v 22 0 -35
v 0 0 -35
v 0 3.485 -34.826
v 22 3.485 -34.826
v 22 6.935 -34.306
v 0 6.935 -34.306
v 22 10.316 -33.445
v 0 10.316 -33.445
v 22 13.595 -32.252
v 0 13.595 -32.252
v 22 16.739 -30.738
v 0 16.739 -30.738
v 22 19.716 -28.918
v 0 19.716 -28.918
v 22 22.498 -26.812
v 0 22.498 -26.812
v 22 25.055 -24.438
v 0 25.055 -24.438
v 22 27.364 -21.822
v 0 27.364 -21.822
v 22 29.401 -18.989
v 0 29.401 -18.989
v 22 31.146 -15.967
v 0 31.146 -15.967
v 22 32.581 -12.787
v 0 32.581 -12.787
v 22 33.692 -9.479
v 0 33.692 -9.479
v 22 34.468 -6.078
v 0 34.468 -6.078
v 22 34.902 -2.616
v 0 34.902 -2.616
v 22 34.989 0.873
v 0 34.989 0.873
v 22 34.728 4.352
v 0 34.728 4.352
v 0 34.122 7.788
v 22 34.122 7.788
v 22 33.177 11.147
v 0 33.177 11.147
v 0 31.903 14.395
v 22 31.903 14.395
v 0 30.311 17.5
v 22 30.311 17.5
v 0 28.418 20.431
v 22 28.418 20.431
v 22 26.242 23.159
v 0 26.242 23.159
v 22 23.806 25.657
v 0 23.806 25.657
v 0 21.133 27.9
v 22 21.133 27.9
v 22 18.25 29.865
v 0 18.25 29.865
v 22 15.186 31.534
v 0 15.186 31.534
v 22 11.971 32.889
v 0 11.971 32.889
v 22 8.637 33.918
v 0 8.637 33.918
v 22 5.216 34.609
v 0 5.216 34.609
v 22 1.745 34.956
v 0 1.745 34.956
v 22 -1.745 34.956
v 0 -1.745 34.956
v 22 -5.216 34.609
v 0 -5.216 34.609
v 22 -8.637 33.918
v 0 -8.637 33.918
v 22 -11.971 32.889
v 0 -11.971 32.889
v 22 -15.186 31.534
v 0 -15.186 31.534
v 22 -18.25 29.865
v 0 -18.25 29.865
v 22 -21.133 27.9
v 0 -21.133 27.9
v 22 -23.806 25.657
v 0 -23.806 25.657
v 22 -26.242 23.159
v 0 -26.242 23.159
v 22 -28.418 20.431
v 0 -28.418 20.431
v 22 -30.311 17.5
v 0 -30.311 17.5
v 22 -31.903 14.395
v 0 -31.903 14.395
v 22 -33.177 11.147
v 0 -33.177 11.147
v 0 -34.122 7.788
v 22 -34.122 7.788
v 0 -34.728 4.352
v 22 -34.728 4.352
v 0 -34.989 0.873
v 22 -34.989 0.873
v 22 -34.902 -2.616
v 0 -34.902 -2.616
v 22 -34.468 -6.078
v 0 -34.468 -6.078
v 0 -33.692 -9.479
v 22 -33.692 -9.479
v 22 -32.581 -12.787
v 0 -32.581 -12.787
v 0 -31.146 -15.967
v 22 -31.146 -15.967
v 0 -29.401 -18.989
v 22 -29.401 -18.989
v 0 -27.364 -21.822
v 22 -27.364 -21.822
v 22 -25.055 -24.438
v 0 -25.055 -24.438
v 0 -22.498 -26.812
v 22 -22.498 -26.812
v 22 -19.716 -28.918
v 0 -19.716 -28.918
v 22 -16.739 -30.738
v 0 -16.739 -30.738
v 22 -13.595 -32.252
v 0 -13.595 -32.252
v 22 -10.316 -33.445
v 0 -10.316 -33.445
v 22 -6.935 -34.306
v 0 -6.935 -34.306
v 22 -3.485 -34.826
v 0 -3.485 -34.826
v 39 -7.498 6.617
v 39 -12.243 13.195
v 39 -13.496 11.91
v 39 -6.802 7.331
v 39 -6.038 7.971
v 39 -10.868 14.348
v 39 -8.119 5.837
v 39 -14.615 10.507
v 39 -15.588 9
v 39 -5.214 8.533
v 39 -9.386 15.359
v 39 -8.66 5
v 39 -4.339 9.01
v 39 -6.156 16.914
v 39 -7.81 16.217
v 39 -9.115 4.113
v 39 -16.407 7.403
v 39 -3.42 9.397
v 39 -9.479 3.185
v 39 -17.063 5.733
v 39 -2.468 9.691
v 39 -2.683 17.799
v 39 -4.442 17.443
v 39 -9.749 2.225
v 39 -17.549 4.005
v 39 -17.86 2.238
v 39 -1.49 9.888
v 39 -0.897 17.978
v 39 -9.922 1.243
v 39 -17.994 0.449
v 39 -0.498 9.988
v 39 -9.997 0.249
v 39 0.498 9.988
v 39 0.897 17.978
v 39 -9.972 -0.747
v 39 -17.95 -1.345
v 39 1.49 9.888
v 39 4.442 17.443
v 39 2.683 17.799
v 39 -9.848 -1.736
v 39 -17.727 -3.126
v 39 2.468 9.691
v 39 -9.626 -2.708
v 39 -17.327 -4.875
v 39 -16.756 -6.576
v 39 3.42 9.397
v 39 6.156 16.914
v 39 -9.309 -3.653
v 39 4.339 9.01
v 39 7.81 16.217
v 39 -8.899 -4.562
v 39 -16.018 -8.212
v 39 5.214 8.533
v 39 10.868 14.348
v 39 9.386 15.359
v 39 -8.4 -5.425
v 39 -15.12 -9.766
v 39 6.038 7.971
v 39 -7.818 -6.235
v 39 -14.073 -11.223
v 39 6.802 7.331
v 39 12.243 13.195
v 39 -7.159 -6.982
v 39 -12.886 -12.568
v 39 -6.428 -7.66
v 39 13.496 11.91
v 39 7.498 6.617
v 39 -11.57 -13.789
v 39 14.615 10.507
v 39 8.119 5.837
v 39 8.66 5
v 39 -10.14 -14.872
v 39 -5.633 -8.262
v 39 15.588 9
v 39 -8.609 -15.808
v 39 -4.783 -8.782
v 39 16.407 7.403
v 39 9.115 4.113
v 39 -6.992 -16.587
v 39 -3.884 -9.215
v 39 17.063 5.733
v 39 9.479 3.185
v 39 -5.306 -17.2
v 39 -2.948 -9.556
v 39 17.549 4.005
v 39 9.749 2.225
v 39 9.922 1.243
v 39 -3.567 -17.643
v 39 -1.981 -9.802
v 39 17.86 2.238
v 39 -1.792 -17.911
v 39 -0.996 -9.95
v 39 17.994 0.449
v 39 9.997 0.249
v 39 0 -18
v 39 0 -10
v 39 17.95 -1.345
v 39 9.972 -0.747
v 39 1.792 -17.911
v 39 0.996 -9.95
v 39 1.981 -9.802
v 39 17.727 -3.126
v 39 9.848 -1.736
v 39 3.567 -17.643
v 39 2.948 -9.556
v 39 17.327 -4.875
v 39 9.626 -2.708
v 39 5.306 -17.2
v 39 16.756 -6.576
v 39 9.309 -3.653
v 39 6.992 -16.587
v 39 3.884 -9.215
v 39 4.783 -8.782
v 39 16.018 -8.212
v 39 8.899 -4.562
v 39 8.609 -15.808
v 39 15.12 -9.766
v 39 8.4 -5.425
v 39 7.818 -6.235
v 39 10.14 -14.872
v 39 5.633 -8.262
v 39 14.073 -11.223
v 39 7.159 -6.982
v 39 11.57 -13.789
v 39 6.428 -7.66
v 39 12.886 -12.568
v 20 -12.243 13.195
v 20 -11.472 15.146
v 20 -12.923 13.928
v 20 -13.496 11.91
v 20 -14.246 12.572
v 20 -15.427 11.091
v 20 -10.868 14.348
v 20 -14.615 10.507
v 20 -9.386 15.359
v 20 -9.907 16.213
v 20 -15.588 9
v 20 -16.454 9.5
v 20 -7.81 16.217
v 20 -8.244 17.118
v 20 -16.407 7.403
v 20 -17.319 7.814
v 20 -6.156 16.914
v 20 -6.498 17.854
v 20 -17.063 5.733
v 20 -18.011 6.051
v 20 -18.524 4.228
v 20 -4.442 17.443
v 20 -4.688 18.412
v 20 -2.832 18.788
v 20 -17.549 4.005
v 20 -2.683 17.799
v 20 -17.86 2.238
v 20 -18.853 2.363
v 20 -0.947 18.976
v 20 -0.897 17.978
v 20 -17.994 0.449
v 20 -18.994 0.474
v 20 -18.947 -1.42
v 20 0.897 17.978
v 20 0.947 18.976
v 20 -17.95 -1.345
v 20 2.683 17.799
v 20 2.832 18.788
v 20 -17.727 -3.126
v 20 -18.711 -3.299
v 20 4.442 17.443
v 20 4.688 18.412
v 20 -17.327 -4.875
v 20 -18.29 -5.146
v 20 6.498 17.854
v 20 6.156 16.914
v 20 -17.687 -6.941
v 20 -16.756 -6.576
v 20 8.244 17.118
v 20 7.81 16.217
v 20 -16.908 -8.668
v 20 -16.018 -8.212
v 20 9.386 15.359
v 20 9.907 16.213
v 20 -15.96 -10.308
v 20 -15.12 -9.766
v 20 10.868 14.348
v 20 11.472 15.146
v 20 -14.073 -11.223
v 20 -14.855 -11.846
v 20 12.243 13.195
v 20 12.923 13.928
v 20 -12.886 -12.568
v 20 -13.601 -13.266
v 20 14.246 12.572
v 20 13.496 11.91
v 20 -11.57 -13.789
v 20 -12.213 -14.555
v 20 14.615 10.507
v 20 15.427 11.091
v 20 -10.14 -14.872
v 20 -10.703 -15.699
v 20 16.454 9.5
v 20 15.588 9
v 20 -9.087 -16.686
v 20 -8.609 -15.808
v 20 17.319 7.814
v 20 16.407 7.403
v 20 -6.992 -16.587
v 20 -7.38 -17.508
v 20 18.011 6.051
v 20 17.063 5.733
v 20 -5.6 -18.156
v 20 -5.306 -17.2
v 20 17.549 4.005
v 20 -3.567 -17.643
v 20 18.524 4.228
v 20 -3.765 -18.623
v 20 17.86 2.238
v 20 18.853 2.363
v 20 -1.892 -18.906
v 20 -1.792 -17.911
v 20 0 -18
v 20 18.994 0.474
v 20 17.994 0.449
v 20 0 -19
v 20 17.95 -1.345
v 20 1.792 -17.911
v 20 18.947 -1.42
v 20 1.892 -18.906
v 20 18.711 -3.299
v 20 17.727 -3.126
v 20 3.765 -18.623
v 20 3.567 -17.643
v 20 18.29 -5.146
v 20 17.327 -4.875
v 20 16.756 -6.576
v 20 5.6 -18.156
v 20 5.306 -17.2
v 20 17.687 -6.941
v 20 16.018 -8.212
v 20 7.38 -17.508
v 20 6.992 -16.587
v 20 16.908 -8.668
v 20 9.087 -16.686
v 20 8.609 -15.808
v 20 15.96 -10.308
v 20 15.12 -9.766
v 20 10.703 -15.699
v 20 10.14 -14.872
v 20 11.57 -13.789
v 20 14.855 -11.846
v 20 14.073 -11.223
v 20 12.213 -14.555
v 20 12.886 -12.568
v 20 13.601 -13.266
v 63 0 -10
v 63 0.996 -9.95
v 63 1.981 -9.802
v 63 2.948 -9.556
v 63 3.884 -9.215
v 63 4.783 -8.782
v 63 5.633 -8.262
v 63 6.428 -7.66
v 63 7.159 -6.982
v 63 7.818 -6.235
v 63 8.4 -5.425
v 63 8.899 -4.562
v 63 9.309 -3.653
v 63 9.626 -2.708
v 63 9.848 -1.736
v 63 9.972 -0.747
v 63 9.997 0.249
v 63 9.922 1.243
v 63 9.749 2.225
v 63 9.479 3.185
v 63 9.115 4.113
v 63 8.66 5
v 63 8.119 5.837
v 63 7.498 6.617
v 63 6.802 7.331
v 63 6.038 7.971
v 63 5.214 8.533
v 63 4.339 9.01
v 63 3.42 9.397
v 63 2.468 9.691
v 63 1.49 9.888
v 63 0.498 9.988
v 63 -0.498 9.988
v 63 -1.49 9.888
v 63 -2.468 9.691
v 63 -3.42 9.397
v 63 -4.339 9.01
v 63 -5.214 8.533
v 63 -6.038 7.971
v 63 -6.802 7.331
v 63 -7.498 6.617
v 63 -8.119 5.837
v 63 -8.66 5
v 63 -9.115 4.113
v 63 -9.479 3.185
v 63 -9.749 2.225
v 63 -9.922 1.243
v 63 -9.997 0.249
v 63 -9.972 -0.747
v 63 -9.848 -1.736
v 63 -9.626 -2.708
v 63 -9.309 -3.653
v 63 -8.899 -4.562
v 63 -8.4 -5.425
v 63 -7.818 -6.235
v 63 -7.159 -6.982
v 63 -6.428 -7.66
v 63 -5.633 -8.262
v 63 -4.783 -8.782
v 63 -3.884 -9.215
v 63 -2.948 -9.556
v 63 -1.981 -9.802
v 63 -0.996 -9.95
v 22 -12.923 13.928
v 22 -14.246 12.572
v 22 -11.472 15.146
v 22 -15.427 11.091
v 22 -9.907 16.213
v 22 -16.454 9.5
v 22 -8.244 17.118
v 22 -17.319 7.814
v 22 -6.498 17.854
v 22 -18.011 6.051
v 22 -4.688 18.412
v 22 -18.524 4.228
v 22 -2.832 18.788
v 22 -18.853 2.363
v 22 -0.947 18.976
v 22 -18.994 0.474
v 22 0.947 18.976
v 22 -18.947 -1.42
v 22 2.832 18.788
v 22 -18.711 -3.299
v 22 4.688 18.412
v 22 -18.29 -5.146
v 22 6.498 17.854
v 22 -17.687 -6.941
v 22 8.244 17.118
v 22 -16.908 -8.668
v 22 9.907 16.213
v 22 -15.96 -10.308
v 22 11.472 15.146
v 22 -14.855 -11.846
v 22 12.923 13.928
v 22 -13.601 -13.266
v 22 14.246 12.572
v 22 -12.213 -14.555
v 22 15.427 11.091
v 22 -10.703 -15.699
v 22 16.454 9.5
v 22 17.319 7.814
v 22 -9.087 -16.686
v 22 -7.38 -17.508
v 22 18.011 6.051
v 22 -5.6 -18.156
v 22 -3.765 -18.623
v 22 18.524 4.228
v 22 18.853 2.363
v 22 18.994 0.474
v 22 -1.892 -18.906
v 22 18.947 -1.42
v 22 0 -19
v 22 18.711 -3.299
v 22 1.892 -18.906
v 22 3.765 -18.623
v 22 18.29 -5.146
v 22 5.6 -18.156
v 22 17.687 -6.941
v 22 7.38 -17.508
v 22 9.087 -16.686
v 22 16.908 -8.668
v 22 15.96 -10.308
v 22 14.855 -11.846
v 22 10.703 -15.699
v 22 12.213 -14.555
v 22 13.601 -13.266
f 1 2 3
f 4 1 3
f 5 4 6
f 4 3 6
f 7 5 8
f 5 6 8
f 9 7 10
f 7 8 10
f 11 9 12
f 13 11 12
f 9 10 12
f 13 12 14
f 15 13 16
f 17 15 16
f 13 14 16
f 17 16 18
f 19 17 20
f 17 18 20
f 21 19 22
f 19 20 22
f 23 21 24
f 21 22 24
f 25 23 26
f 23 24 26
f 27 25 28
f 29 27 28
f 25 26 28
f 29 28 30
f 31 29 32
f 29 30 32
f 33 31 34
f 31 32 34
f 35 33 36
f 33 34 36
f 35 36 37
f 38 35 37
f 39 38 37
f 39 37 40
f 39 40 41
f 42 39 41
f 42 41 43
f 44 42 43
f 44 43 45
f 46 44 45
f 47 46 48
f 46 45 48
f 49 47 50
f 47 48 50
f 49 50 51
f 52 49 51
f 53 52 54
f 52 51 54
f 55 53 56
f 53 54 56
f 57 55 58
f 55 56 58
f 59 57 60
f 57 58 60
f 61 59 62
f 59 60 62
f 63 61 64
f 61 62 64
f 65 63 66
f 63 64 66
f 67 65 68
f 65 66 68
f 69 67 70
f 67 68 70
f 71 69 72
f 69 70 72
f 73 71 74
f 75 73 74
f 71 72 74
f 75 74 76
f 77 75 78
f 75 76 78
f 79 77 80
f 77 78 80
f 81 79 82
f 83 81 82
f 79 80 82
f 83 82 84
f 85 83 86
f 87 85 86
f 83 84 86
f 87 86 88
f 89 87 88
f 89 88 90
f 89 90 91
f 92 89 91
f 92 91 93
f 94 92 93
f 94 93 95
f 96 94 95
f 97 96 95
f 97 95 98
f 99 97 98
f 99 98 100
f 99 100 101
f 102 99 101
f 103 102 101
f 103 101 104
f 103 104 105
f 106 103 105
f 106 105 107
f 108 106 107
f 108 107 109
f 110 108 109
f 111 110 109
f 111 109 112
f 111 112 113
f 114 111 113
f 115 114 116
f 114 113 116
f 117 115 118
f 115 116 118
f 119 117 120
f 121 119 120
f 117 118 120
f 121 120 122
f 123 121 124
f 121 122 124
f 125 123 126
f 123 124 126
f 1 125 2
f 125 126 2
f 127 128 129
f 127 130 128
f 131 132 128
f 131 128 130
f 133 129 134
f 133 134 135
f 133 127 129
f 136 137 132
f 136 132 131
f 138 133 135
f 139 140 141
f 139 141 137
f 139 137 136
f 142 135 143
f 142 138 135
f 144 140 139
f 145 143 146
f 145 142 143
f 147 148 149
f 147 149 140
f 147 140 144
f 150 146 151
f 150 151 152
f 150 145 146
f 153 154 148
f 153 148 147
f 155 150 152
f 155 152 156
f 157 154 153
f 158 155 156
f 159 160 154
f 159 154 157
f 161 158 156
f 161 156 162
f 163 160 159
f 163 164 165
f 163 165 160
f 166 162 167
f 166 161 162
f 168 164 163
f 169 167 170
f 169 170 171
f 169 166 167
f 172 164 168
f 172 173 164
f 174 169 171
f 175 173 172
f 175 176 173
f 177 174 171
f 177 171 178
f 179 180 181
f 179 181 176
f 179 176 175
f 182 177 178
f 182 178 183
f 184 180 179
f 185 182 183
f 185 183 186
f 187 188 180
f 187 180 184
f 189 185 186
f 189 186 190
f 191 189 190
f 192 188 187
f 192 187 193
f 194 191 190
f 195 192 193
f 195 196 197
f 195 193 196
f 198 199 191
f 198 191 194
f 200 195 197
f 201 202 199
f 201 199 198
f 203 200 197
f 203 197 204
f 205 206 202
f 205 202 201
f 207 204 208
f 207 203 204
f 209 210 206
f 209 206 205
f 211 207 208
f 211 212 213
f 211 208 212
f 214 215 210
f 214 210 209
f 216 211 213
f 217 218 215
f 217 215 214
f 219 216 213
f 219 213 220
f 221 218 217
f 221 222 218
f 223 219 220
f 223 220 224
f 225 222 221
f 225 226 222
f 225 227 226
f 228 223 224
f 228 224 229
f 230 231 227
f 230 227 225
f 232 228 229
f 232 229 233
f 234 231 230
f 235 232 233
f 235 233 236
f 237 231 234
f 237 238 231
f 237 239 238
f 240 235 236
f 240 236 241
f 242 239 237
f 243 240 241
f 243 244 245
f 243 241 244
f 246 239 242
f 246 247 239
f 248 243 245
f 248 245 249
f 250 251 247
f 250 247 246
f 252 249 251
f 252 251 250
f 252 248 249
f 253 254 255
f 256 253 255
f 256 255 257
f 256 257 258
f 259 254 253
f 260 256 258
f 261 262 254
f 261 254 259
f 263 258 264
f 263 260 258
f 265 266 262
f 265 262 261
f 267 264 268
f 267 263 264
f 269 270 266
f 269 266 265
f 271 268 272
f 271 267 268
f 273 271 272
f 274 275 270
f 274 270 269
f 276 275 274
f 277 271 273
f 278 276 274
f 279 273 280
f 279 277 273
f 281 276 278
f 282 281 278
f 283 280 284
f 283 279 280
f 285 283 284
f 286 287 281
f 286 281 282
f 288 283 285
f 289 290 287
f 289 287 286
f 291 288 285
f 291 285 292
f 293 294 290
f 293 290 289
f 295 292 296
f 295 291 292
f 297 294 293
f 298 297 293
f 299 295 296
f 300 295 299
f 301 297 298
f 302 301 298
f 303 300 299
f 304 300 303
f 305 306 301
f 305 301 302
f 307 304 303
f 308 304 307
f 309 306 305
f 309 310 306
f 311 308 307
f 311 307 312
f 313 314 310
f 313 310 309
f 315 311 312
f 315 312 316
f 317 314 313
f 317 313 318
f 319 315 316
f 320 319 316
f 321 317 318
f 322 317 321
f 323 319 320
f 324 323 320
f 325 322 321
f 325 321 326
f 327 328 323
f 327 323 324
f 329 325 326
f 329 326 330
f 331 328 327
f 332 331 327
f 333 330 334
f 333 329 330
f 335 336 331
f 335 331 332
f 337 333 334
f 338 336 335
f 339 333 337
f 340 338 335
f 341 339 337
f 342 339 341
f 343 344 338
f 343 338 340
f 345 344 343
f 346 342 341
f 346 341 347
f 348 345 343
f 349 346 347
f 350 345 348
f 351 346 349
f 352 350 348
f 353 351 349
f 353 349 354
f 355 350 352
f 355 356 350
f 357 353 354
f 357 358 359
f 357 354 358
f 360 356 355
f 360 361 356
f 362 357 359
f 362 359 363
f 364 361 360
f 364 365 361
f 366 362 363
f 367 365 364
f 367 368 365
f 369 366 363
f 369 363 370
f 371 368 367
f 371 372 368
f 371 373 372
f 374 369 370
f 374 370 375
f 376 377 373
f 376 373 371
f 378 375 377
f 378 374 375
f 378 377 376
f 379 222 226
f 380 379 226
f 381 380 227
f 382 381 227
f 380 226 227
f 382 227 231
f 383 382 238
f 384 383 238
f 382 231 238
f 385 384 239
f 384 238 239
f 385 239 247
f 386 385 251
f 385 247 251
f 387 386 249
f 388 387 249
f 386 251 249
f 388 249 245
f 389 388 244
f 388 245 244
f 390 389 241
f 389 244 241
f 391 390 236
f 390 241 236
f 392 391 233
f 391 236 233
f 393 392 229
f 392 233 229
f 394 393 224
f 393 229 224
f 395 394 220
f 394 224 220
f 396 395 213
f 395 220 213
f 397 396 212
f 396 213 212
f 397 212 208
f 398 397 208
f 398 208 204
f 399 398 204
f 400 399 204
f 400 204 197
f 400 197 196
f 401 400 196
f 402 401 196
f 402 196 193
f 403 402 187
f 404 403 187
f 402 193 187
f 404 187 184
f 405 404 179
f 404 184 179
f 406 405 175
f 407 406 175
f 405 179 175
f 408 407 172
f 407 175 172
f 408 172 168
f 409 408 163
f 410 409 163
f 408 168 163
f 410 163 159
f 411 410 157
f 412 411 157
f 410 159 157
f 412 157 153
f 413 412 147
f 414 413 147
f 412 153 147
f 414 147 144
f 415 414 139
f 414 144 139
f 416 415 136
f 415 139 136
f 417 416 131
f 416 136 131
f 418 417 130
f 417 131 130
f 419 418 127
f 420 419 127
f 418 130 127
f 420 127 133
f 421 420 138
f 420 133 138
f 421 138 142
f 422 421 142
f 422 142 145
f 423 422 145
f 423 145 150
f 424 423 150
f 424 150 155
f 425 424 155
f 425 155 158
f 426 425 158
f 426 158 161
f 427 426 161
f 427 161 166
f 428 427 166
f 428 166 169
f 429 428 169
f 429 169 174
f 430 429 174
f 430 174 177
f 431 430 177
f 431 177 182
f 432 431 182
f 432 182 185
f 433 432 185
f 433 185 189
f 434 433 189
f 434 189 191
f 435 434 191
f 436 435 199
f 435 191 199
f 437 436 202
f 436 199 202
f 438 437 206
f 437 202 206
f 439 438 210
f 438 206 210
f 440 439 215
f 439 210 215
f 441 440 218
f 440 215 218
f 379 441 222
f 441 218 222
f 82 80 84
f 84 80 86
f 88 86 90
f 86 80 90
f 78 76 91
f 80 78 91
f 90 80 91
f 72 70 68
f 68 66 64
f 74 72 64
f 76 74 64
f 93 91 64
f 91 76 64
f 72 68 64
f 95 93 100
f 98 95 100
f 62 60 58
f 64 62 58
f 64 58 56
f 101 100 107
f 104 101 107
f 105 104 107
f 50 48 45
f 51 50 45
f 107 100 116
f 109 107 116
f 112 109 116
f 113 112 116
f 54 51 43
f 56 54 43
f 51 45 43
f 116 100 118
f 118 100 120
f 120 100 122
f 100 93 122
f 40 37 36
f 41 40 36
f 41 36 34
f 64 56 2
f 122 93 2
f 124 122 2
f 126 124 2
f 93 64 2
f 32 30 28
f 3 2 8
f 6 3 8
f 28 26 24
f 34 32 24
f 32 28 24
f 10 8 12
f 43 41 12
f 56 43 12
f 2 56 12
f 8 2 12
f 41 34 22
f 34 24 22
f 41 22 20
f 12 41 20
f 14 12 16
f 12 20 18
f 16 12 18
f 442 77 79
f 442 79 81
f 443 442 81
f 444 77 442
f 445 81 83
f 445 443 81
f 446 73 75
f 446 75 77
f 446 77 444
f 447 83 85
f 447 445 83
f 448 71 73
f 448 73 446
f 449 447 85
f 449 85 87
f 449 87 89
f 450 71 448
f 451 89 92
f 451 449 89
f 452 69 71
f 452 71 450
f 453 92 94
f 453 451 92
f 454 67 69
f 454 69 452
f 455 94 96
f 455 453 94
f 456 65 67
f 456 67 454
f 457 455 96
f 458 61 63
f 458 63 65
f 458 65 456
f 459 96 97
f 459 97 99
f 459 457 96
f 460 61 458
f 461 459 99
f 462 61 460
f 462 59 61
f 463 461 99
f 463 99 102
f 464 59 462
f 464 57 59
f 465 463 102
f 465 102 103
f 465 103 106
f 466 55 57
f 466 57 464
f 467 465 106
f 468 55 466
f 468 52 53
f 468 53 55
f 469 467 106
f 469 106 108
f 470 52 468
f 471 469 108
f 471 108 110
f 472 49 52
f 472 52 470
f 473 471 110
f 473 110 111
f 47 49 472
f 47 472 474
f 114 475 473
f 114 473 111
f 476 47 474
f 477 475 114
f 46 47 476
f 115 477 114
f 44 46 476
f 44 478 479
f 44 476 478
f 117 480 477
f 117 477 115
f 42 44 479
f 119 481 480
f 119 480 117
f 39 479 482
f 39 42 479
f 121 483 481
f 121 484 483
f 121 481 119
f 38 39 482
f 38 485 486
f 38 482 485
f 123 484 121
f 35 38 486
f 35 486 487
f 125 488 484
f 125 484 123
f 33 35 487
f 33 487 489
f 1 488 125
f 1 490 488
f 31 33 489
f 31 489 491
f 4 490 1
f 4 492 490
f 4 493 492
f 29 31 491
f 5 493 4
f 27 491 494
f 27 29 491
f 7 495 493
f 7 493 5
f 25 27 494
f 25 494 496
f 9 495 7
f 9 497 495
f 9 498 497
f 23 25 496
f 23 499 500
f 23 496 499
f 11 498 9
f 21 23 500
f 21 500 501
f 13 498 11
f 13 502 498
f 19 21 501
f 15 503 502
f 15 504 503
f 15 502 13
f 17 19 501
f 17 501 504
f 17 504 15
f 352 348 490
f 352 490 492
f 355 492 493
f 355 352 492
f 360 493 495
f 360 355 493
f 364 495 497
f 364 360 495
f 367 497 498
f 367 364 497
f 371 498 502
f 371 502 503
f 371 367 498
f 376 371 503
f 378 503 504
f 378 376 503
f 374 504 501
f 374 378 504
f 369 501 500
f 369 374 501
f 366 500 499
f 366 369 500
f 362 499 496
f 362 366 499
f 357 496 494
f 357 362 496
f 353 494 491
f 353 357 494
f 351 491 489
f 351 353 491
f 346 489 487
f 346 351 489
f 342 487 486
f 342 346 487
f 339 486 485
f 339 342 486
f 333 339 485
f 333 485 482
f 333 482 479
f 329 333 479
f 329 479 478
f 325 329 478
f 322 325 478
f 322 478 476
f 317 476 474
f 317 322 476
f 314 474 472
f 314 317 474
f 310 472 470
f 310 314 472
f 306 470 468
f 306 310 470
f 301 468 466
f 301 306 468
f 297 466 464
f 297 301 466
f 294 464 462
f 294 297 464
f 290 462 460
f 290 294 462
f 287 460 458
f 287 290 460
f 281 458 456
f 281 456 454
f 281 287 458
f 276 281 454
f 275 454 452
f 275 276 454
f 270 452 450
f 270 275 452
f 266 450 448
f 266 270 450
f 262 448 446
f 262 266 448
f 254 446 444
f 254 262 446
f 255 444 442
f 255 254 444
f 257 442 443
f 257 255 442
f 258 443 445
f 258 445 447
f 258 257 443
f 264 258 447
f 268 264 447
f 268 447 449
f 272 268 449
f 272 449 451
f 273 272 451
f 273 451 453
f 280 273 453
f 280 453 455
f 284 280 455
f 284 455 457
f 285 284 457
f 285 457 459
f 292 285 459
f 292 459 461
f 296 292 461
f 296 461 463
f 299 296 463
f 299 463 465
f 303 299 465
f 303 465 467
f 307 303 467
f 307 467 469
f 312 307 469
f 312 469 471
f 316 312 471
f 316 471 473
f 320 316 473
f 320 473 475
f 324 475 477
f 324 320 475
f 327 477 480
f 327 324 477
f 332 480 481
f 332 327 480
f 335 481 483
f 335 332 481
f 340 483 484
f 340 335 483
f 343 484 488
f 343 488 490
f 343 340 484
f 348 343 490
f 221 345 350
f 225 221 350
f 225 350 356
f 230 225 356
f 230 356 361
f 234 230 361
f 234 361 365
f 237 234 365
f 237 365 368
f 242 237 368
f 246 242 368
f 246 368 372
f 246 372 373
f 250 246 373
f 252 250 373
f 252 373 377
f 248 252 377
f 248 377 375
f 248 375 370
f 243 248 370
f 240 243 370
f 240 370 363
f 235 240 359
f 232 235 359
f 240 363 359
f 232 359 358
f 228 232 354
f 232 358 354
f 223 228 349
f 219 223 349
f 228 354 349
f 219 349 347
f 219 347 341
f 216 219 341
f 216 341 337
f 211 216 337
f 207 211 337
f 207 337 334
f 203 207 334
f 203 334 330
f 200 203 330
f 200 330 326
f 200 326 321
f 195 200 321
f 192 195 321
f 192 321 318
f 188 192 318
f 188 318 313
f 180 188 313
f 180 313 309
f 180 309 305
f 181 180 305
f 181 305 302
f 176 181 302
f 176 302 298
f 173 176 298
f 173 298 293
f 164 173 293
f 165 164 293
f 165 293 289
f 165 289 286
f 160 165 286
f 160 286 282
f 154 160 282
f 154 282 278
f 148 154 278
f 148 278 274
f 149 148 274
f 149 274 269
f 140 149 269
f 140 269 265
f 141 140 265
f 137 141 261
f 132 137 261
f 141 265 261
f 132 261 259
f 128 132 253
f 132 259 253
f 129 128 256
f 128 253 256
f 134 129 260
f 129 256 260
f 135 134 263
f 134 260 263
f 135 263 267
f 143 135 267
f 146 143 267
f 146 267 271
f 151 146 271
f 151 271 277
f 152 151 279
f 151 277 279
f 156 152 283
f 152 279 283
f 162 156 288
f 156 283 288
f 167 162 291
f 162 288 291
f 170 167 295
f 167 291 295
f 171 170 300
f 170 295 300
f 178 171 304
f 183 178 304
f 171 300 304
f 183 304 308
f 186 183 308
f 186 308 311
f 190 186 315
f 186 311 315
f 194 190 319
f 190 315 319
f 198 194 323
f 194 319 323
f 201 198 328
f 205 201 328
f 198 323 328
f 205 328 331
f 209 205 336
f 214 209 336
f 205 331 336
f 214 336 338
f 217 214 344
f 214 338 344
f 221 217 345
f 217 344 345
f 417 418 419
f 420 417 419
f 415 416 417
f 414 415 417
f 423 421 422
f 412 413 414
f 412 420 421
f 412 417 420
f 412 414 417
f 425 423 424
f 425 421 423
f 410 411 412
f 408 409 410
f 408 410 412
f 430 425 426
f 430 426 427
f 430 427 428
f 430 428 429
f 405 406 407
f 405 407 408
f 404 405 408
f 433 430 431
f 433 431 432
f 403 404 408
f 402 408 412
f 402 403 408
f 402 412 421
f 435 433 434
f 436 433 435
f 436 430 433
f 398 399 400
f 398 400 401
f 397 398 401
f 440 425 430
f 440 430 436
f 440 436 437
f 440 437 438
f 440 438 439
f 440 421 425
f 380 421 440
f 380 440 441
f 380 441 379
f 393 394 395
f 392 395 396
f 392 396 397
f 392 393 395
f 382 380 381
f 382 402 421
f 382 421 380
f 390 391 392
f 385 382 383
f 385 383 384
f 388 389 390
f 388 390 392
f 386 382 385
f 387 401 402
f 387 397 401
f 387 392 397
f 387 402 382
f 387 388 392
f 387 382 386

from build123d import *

# Parameters (mm, degrees)
SKETCH1_R           = 35
BOSS_EXTRUDE1_DEPTH = 22
SKETCH2_R           = 18
BOSS_EXTRUDE2_DEPTH = 17
SKETCH3_R           = 10
BOSS_EXTRUDE3_DEPTH = 24
CUT_EXTRUDE1_START  = -2
SKETCH4_R           = 19
SKETCH4_R_2         = 18
CUT_EXTRUDE1_DEPTH  = 2


with BuildPart() as part:
    # Sketch1 → Boss-Extrude1 (new body)
    with BuildSketch(Plane(origin=(0, 0, 0), x_dir=(0, 0, -1), z_dir=(1, 0, 0))):
        Circle(SKETCH1_R)
    extrude(amount=BOSS_EXTRUDE1_DEPTH)

    # Sketch2 → Boss-Extrude2 (add)
    with BuildSketch(Plane(origin=(22, 0, 0), x_dir=(0, 0, -1), z_dir=(1, 0, 0))):
        Circle(SKETCH2_R)
    extrude(amount=BOSS_EXTRUDE2_DEPTH)

    # Sketch3 → Boss-Extrude3 (add)
    with BuildSketch(Plane(origin=(39, 0, 0), x_dir=(0, 0, -1), z_dir=(1, 0, 0))):
        Circle(SKETCH3_R)
    extrude(amount=BOSS_EXTRUDE3_DEPTH)

    # Sketch4 → Cut-Extrude1 (cut)
    with BuildSketch(Plane(origin=(22, 0, 0), x_dir=(0, 0, -1), z_dir=(1, 0, 0)).offset(CUT_EXTRUDE1_START)):
        Circle(SKETCH4_R)
        Circle(SKETCH4_R_2, mode=Mode.SUBTRACT)
    extrude(amount=CUT_EXTRUDE1_DEPTH, mode=Mode.SUBTRACT)


solid = part.part
